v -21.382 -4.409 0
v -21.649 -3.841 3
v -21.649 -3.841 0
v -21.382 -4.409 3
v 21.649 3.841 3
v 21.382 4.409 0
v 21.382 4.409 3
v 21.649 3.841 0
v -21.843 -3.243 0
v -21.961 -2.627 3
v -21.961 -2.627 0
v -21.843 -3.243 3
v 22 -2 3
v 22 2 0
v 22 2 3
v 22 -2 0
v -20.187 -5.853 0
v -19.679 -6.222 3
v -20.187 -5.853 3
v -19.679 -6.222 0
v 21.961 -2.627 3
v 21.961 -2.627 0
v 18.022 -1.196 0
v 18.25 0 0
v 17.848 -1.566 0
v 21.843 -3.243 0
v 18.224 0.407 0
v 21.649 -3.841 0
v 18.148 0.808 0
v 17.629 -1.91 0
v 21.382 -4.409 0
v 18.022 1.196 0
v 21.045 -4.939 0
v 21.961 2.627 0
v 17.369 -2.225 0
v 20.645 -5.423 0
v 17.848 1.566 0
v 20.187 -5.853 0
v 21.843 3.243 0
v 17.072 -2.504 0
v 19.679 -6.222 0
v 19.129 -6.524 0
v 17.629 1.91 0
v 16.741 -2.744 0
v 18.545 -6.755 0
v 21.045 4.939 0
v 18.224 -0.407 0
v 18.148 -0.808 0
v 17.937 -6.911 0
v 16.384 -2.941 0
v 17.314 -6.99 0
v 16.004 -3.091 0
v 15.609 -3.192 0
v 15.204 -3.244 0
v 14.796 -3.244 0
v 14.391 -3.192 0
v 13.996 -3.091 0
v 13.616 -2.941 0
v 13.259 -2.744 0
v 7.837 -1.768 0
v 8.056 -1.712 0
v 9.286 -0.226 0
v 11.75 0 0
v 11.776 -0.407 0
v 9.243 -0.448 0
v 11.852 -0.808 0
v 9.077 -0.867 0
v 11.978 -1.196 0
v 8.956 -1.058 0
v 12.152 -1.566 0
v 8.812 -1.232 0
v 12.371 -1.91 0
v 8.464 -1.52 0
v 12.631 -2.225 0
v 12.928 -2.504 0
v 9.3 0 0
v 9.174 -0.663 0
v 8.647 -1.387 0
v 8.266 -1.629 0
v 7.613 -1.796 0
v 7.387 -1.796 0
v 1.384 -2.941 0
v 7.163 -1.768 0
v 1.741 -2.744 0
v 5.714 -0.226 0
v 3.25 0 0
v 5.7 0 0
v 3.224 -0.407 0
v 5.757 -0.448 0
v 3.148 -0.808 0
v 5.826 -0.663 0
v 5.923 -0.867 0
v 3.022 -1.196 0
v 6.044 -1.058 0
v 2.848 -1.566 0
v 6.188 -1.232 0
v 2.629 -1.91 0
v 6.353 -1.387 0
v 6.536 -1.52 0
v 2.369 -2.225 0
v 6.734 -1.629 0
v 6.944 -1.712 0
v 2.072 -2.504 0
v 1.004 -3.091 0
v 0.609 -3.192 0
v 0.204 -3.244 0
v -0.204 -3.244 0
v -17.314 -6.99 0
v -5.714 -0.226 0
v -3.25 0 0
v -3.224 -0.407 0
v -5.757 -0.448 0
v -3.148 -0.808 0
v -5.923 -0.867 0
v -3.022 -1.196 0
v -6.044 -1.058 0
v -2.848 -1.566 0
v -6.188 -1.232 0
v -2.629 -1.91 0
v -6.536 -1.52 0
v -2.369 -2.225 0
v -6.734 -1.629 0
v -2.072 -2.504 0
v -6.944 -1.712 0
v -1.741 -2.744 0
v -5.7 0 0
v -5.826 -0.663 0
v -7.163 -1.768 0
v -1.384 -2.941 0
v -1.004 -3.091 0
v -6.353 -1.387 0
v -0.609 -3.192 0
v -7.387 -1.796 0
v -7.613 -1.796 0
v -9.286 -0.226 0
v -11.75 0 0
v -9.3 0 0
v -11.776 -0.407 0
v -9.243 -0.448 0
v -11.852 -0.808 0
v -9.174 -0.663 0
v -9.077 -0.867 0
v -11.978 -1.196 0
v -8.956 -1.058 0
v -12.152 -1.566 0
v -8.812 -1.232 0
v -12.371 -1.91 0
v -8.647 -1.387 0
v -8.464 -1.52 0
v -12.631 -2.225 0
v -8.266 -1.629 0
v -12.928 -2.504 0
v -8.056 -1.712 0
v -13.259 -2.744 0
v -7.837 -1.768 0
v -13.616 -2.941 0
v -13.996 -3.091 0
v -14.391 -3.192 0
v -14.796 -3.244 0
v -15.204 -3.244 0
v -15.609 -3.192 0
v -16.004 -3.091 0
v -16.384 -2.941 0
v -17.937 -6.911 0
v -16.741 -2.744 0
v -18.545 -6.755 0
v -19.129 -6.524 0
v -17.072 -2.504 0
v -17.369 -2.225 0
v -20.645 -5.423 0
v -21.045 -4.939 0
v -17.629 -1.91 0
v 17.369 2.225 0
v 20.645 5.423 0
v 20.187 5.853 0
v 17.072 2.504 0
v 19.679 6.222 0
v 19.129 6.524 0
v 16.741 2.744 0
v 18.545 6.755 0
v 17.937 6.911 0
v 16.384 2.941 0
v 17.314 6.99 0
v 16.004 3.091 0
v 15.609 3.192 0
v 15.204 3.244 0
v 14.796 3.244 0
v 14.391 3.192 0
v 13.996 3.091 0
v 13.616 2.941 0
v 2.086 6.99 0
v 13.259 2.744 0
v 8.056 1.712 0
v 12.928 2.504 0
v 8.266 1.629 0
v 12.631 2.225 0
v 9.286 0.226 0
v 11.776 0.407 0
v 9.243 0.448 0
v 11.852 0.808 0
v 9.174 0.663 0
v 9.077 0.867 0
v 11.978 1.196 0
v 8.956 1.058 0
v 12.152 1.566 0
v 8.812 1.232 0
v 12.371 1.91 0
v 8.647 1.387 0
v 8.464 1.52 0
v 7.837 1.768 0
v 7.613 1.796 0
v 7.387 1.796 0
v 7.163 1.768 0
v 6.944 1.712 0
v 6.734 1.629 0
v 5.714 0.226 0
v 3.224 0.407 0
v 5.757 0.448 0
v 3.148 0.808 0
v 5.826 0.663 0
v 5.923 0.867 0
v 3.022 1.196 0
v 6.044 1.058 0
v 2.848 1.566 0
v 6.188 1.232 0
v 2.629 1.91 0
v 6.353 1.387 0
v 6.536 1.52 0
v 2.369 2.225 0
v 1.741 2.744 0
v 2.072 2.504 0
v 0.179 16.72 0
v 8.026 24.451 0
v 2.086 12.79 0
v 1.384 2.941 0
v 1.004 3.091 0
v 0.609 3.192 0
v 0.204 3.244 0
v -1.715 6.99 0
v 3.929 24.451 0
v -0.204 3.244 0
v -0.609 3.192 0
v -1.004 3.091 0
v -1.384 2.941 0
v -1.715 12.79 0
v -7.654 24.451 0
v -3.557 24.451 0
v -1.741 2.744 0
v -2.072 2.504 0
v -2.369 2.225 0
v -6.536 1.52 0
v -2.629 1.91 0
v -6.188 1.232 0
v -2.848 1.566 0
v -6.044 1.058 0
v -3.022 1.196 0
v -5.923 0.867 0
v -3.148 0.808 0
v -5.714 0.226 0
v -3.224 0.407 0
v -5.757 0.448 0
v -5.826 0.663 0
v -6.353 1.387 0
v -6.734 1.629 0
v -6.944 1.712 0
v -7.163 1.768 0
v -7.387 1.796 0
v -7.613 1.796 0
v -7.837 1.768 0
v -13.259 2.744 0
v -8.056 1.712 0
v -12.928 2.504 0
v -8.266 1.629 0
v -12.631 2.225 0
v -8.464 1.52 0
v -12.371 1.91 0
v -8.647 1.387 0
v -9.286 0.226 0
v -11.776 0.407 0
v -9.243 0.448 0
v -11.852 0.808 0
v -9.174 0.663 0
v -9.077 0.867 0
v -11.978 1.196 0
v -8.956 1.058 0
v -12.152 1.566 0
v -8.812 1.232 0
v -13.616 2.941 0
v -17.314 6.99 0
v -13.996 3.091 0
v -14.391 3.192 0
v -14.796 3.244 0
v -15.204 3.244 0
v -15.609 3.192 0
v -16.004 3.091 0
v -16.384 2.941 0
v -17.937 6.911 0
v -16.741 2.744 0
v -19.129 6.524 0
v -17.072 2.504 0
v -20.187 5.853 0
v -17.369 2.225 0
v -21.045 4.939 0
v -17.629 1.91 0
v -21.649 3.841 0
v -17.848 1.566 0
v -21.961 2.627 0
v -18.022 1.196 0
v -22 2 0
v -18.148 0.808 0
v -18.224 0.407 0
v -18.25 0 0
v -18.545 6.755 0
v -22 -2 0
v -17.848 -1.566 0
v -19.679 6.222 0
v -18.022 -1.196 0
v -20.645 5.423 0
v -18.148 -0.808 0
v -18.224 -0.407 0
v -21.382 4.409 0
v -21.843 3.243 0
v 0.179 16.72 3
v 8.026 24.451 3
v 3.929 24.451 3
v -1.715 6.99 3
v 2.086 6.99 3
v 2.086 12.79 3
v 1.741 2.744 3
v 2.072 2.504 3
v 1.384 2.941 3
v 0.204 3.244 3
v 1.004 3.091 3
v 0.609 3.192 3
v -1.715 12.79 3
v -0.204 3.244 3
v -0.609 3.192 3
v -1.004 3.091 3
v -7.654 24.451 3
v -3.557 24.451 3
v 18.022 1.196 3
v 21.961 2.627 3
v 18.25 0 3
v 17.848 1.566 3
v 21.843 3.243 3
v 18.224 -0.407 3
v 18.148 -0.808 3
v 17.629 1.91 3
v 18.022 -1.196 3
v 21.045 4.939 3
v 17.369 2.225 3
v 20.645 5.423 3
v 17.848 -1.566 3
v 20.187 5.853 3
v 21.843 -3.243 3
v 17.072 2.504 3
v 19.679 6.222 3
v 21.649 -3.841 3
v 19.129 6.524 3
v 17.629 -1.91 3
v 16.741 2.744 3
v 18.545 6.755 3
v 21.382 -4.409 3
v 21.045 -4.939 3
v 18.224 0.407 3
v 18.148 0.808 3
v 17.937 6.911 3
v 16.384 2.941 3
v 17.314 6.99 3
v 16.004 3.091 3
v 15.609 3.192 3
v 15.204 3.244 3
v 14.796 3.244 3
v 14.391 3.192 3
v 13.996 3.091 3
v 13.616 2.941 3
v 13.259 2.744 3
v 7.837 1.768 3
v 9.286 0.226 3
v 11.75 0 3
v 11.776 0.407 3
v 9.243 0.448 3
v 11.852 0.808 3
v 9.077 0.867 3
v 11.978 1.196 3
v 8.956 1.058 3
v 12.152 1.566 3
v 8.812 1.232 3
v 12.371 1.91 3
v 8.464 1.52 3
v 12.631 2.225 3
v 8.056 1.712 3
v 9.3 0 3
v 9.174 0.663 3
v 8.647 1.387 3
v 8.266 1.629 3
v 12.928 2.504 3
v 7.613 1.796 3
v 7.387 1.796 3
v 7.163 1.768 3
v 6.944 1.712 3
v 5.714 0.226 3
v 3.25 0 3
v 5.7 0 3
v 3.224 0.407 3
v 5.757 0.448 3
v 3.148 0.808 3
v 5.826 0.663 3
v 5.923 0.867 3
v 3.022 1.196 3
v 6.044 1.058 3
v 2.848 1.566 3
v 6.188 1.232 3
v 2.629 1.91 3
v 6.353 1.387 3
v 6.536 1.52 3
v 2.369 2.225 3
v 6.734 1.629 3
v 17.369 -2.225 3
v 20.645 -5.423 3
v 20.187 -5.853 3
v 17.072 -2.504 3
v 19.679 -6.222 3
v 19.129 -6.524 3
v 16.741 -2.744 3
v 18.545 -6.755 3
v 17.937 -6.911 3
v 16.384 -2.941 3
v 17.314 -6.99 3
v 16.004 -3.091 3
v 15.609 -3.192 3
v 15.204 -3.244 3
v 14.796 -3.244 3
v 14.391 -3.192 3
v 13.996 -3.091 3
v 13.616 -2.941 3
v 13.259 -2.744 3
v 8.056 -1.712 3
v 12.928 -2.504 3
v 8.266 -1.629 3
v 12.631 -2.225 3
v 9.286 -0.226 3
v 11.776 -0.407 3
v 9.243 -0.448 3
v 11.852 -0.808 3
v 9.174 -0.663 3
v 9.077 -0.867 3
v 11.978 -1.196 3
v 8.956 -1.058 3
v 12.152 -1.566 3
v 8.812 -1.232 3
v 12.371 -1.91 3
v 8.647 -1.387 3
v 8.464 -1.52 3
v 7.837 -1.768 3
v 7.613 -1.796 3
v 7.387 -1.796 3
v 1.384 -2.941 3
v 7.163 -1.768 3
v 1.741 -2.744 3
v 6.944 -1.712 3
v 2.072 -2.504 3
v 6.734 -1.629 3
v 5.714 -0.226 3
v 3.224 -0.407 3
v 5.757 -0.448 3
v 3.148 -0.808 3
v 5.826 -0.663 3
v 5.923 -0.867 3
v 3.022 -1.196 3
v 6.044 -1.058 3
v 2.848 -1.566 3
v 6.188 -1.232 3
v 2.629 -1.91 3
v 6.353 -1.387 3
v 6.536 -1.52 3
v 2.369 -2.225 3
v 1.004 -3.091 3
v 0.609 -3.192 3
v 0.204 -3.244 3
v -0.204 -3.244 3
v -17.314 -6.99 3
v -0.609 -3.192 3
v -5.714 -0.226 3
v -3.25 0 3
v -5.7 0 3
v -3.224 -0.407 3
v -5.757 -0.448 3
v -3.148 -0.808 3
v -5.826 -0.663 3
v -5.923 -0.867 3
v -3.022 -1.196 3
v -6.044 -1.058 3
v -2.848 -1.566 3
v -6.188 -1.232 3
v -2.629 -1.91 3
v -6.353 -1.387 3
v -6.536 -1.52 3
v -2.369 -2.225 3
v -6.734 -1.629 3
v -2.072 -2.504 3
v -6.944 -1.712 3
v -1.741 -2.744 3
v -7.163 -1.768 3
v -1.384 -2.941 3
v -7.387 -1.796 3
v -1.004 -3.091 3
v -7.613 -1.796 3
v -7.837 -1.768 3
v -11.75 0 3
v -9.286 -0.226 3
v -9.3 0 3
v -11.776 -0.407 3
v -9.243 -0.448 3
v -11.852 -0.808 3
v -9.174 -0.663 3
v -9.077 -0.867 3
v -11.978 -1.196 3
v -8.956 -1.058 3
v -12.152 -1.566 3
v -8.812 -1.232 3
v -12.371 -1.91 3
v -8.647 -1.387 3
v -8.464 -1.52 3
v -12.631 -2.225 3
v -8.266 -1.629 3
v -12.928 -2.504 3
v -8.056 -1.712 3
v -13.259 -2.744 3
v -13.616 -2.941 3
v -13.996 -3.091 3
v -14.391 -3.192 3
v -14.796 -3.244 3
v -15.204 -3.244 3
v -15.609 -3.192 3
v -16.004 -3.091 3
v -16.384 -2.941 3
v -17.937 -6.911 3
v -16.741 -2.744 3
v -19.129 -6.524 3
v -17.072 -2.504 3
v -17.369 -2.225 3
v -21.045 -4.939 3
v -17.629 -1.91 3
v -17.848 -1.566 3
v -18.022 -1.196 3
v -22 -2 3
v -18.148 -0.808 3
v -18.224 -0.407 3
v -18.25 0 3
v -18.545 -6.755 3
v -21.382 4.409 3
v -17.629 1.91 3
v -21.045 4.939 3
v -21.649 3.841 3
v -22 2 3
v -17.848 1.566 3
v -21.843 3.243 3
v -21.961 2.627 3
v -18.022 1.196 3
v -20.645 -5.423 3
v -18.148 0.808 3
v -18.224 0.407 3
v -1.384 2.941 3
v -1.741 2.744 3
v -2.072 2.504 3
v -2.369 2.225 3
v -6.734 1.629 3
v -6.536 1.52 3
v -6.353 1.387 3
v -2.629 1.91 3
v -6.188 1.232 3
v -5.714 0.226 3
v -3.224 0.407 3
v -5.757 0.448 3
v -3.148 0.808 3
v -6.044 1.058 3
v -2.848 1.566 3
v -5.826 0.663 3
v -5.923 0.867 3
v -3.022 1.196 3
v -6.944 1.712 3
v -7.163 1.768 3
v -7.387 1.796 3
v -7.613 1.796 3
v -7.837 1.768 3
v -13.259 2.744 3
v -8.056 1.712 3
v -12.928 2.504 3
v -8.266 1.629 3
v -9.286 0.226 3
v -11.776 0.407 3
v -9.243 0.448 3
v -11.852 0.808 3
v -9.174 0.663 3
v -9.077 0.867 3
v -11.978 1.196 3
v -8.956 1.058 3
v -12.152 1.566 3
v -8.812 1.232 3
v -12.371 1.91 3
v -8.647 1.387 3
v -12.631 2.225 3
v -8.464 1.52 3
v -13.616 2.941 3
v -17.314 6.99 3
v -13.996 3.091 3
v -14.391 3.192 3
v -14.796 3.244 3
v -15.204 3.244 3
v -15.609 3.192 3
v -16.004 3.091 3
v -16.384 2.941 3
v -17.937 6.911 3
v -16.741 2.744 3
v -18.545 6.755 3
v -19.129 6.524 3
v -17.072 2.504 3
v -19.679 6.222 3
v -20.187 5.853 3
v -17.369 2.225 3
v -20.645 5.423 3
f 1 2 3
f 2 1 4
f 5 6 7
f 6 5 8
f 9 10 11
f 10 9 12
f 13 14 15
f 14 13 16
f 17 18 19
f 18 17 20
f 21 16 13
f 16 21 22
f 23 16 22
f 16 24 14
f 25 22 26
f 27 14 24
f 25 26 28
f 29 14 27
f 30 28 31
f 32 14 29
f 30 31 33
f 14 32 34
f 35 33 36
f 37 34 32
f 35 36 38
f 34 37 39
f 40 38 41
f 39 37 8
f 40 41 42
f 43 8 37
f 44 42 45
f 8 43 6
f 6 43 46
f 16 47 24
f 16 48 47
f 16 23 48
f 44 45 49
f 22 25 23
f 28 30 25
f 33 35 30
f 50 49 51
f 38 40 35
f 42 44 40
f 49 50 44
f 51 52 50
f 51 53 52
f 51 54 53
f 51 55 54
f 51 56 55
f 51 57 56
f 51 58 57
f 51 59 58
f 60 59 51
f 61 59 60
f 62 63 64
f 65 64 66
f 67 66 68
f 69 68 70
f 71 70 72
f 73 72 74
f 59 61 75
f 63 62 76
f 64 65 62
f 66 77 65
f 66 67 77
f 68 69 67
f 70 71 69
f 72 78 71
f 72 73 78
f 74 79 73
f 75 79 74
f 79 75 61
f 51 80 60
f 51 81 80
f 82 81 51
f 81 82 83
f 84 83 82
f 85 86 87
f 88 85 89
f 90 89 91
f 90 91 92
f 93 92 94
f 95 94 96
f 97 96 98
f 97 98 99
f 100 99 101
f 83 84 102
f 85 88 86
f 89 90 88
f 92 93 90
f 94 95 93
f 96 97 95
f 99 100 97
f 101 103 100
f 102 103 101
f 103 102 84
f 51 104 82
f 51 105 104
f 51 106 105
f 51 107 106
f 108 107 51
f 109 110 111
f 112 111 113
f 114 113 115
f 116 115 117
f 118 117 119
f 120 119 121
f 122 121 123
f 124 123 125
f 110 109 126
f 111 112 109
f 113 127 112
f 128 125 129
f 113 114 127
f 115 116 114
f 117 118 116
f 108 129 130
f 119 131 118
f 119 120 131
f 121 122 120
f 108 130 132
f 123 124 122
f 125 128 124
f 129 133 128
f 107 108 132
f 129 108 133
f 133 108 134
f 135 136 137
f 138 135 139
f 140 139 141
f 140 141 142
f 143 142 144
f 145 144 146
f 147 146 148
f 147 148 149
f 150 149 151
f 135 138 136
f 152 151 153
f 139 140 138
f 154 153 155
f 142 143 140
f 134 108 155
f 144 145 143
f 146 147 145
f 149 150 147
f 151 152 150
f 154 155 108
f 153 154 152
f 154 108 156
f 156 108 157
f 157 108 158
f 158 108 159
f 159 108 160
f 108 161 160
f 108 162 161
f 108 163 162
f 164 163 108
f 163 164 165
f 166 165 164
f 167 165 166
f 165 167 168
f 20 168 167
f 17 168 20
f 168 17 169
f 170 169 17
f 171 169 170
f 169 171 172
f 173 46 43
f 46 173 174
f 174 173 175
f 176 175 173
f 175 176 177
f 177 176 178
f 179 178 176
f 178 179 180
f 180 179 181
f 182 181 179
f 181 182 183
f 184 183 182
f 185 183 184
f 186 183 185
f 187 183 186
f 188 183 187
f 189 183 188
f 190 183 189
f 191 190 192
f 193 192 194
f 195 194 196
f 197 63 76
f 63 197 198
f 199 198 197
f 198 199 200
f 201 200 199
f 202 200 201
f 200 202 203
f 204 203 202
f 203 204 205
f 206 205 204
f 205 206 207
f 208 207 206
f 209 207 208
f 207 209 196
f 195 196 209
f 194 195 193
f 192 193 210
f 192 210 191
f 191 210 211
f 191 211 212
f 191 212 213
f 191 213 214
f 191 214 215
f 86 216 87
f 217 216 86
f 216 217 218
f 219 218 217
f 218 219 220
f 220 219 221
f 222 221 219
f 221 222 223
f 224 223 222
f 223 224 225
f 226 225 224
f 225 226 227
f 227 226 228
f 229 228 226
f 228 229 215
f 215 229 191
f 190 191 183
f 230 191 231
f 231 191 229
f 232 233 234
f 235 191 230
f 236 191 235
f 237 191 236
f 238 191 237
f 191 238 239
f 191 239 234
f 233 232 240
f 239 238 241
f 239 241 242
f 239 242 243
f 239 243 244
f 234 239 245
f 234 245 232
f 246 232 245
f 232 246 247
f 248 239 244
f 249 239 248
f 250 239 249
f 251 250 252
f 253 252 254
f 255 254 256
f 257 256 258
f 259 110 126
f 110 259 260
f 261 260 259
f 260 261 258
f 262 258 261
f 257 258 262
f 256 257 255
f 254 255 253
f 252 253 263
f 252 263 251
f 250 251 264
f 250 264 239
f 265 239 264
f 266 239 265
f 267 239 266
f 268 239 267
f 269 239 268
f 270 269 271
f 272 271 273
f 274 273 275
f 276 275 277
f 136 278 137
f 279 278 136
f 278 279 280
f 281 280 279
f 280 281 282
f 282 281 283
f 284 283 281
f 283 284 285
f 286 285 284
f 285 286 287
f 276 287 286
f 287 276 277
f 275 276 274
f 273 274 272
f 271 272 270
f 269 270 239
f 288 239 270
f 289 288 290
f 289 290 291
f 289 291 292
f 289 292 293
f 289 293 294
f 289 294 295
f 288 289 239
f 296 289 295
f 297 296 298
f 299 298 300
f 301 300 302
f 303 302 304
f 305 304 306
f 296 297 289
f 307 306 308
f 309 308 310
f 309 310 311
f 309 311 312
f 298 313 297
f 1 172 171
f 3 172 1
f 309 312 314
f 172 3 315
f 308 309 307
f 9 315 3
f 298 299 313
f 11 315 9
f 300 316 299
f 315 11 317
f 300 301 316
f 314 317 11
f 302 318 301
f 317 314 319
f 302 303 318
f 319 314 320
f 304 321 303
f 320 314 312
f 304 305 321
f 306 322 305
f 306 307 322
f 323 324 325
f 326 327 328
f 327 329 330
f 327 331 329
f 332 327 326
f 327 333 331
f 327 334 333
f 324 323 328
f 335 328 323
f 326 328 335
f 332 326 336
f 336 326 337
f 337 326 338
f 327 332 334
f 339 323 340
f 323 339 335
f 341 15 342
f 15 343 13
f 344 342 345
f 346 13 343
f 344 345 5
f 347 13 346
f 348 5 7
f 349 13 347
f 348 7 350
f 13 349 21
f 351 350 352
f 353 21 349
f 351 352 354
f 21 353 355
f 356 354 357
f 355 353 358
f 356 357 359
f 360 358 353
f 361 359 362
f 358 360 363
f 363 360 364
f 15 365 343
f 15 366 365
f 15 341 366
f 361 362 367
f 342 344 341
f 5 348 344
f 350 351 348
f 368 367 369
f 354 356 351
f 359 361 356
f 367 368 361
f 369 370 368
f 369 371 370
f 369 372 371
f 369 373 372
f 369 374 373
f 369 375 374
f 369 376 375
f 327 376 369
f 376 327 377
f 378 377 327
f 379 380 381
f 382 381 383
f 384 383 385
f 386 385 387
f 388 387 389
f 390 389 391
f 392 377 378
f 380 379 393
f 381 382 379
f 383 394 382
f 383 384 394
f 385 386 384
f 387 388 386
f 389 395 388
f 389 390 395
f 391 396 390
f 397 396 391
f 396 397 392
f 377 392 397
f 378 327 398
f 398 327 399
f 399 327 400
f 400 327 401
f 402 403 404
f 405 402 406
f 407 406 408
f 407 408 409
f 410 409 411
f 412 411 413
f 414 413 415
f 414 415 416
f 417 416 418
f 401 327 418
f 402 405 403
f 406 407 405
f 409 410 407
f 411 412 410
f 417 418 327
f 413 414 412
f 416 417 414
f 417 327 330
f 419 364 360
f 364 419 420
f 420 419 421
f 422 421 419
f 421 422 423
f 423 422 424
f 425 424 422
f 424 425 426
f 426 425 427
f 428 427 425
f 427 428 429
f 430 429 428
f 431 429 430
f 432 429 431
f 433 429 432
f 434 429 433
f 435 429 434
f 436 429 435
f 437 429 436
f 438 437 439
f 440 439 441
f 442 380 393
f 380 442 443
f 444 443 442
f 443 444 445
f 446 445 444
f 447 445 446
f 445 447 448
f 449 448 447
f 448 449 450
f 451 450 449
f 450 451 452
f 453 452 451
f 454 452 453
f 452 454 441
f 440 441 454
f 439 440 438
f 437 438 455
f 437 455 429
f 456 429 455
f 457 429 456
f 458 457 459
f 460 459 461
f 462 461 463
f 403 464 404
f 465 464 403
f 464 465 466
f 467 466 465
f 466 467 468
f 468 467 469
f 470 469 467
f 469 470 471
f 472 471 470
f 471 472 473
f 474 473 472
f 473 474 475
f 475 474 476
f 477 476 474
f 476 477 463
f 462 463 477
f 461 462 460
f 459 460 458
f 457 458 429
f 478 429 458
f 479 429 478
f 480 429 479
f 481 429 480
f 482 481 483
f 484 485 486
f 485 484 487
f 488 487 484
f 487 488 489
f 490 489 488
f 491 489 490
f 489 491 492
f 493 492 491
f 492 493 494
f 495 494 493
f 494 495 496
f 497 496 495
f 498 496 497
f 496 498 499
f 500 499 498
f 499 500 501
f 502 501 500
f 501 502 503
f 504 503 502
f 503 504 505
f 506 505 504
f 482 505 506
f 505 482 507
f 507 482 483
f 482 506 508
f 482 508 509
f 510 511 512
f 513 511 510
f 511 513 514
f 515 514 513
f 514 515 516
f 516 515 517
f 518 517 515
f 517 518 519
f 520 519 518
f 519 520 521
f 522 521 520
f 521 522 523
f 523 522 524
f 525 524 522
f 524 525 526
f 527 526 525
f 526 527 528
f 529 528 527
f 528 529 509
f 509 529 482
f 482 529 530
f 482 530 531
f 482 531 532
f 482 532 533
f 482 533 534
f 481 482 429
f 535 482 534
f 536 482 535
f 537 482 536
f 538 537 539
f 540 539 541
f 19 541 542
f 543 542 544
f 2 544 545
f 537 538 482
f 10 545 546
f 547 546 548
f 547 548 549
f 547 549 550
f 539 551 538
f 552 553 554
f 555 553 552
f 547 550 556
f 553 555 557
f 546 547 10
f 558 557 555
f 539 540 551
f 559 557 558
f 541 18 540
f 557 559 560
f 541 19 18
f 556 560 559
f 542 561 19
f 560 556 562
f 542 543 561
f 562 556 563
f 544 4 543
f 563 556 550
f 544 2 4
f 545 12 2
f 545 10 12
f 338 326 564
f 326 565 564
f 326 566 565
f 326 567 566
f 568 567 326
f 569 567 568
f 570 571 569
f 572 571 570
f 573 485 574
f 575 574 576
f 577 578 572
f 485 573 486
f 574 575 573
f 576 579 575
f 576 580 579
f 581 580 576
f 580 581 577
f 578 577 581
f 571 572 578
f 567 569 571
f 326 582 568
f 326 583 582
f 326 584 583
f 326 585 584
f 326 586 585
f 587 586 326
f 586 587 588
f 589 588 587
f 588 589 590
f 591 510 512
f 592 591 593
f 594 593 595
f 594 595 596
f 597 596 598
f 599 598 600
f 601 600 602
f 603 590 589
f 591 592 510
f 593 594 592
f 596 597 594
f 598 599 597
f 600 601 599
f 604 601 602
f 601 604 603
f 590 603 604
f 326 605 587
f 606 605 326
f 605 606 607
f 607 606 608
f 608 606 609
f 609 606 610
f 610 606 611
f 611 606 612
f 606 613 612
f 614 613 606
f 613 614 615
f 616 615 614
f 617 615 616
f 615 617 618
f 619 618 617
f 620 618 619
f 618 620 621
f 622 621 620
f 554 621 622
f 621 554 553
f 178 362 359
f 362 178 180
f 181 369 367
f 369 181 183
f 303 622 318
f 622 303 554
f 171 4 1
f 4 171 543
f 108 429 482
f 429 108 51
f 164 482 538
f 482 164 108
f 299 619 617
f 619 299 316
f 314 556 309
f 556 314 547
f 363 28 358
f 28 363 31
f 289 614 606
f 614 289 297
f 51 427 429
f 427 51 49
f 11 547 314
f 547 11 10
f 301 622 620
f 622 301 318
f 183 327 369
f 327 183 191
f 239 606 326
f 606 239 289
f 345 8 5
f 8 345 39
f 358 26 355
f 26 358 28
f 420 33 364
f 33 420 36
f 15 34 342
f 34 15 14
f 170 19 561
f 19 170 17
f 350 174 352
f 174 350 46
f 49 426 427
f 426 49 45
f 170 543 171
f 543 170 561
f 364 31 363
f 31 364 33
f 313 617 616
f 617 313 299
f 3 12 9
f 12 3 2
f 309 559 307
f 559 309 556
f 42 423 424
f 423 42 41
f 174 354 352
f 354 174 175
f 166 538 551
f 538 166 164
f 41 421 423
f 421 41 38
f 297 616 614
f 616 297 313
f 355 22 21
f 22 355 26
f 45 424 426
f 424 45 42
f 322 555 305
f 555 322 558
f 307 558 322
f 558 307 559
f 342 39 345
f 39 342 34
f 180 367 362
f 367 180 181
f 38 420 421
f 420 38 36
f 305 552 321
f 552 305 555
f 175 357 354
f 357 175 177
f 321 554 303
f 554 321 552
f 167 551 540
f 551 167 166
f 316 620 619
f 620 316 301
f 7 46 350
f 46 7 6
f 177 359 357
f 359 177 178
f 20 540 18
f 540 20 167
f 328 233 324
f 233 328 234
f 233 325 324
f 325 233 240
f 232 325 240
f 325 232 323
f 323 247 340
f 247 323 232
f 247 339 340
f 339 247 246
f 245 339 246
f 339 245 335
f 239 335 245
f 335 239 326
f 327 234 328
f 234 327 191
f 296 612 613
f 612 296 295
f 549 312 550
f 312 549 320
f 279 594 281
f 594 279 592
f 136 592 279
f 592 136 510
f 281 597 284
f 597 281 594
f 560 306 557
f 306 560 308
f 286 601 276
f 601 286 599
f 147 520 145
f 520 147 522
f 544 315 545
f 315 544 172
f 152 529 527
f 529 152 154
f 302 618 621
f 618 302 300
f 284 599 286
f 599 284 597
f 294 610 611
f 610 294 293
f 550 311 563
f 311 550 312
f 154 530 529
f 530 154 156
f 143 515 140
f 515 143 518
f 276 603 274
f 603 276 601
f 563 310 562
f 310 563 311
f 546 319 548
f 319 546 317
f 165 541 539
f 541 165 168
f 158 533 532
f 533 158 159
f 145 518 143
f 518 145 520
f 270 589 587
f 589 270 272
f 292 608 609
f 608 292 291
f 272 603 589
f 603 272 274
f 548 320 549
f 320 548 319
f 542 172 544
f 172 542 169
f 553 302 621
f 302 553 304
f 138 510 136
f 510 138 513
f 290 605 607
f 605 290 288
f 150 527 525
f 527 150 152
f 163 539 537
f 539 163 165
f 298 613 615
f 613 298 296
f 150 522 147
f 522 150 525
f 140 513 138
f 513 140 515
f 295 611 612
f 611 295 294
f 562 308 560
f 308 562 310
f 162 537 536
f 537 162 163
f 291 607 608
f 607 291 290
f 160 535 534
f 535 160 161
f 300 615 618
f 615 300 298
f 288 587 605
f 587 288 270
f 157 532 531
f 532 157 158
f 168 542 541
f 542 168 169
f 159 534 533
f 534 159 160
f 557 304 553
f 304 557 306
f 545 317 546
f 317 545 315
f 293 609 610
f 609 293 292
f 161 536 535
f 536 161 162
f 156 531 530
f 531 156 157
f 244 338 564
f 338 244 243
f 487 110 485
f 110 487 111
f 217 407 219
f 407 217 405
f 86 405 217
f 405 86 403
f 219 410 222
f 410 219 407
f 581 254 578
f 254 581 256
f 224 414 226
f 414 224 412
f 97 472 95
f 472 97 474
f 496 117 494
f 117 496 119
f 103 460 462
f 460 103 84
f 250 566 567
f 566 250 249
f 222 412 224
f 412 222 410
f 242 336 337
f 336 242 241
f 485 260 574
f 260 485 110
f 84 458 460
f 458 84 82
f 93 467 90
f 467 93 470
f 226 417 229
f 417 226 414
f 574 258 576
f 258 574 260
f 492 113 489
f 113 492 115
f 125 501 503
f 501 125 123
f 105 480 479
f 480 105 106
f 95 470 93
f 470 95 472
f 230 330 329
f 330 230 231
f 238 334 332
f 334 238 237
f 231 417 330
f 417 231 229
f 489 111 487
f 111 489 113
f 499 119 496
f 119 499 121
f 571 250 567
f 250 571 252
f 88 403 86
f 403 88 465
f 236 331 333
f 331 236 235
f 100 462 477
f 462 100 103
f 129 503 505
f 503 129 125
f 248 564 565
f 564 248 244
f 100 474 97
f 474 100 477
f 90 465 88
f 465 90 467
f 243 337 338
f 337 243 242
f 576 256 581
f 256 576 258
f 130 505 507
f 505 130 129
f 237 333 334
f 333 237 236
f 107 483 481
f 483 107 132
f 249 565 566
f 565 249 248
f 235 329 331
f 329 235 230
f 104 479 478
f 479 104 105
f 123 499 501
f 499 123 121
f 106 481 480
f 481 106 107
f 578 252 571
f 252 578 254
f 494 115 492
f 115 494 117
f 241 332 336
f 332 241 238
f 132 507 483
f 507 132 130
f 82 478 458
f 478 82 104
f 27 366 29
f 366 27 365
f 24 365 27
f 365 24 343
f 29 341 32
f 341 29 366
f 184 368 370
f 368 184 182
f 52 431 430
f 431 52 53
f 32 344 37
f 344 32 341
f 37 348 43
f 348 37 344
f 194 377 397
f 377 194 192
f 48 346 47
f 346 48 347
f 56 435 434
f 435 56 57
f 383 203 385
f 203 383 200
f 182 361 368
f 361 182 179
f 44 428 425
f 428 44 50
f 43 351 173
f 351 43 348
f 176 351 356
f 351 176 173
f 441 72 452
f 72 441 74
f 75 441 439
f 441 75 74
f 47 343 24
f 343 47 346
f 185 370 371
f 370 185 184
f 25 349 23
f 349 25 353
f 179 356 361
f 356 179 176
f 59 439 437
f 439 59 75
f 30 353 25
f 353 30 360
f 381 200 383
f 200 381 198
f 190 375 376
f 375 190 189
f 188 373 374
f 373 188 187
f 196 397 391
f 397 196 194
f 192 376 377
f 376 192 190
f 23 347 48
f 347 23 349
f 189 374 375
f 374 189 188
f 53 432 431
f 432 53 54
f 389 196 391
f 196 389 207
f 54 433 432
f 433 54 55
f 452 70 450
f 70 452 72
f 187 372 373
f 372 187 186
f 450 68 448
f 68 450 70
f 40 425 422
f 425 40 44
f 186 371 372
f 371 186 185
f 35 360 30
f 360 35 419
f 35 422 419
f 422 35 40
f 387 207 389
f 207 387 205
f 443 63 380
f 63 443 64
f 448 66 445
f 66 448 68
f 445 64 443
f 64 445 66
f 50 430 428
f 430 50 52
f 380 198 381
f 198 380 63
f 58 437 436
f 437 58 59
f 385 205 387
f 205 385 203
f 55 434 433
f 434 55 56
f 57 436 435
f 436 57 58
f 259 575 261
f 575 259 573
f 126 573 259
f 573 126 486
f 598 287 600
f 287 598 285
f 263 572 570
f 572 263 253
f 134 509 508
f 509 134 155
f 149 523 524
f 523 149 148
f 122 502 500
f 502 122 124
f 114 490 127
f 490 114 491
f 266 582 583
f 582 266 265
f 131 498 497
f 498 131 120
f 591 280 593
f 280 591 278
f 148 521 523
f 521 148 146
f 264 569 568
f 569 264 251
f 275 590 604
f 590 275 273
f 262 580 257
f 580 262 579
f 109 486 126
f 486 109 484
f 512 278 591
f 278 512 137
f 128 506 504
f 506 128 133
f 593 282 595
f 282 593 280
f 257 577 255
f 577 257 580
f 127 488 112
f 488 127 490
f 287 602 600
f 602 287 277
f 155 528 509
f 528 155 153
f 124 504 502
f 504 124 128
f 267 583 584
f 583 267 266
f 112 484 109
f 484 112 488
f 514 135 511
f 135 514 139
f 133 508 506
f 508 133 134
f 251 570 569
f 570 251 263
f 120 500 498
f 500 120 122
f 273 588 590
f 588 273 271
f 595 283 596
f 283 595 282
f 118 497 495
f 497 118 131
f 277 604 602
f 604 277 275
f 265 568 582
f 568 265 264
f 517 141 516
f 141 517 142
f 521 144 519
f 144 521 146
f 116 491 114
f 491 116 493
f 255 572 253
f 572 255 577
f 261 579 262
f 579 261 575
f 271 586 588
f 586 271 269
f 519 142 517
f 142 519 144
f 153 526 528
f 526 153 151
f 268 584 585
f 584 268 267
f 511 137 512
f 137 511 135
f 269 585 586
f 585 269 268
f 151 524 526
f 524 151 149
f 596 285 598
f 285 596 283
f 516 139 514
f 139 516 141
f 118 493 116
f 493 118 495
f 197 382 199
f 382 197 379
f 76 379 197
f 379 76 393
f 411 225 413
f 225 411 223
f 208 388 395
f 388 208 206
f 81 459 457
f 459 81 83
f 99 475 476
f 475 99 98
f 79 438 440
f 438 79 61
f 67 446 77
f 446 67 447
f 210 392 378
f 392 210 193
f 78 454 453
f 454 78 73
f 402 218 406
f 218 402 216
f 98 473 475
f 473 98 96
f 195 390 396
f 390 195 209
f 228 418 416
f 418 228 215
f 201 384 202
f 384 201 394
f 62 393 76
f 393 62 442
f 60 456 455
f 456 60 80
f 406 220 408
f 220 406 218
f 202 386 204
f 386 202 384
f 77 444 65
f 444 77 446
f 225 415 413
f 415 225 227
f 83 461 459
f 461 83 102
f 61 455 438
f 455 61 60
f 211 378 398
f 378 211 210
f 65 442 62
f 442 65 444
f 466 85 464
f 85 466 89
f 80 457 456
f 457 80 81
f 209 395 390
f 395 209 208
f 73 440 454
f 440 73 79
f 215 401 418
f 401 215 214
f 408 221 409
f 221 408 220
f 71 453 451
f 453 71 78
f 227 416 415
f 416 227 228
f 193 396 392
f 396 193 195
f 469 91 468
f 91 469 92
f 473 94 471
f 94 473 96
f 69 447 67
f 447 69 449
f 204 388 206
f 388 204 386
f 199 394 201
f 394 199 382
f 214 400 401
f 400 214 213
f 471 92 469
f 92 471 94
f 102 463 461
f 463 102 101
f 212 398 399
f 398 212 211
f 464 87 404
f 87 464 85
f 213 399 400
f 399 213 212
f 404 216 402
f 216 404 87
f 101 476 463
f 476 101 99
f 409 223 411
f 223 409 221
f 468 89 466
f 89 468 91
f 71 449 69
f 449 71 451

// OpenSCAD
$fn = 50;


difference() {
	union() {
		hull() {
			translate(v = [-17.0000000000, 2.0000000000, 0]) {
				cylinder(h = 3, r = 5);
			}
			translate(v = [17.0000000000, 2.0000000000, 0]) {
				cylinder(h = 3, r = 5);
			}
			translate(v = [-17.0000000000, -2.0000000000, 0]) {
				cylinder(h = 3, r = 5);
			}
			translate(v = [17.0000000000, -2.0000000000, 0]) {
				cylinder(h = 3, r = 5);
			}
		}
		translate(v = [0, 24, 0]) {
			linear_extrude(height = 3) {
				text(font = "DejaVu Sans Mono:style=Bold", halign = "center", size = 19.0000000000, text = "Y", valign = "top");
			}
		}
	}
	union() {
		translate(v = [-15.0000000000, 0.0000000000, 0]) {
			translate(v = [0, 0, -100]) {
				cylinder(h = 200, r = 3.2500000000);
			}
		}
		translate(v = [0, 0, -100]) {
			cylinder(h = 200, r = 3.2500000000);
		}
		translate(v = [15.0000000000, 0.0000000000, 0]) {
			translate(v = [0, 0, -100]) {
				cylinder(h = 200, r = 3.2500000000);
			}
		}
		translate(v = [-15.0000000000, 0.0000000000, 0]) {
			translate(v = [0, 0, -100]) {
				cylinder(h = 200, r = 1.8000000000);
			}
		}
		translate(v = [-7.5000000000, 0.0000000000, 0]) {
			translate(v = [0, 0, -100]) {
				cylinder(h = 200, r = 1.8000000000);
			}
		}
		translate(v = [0, 0, -100]) {
			cylinder(h = 200, r = 1.8000000000);
		}
		translate(v = [7.5000000000, 0.0000000000, 0]) {
			translate(v = [0, 0, -100]) {
				cylinder(h = 200, r = 1.8000000000);
			}
		}
		translate(v = [15.0000000000, 0.0000000000, 0]) {
			translate(v = [0, 0, -100]) {
				cylinder(h = 200, r = 1.8000000000);
			}
		}
	}
}
